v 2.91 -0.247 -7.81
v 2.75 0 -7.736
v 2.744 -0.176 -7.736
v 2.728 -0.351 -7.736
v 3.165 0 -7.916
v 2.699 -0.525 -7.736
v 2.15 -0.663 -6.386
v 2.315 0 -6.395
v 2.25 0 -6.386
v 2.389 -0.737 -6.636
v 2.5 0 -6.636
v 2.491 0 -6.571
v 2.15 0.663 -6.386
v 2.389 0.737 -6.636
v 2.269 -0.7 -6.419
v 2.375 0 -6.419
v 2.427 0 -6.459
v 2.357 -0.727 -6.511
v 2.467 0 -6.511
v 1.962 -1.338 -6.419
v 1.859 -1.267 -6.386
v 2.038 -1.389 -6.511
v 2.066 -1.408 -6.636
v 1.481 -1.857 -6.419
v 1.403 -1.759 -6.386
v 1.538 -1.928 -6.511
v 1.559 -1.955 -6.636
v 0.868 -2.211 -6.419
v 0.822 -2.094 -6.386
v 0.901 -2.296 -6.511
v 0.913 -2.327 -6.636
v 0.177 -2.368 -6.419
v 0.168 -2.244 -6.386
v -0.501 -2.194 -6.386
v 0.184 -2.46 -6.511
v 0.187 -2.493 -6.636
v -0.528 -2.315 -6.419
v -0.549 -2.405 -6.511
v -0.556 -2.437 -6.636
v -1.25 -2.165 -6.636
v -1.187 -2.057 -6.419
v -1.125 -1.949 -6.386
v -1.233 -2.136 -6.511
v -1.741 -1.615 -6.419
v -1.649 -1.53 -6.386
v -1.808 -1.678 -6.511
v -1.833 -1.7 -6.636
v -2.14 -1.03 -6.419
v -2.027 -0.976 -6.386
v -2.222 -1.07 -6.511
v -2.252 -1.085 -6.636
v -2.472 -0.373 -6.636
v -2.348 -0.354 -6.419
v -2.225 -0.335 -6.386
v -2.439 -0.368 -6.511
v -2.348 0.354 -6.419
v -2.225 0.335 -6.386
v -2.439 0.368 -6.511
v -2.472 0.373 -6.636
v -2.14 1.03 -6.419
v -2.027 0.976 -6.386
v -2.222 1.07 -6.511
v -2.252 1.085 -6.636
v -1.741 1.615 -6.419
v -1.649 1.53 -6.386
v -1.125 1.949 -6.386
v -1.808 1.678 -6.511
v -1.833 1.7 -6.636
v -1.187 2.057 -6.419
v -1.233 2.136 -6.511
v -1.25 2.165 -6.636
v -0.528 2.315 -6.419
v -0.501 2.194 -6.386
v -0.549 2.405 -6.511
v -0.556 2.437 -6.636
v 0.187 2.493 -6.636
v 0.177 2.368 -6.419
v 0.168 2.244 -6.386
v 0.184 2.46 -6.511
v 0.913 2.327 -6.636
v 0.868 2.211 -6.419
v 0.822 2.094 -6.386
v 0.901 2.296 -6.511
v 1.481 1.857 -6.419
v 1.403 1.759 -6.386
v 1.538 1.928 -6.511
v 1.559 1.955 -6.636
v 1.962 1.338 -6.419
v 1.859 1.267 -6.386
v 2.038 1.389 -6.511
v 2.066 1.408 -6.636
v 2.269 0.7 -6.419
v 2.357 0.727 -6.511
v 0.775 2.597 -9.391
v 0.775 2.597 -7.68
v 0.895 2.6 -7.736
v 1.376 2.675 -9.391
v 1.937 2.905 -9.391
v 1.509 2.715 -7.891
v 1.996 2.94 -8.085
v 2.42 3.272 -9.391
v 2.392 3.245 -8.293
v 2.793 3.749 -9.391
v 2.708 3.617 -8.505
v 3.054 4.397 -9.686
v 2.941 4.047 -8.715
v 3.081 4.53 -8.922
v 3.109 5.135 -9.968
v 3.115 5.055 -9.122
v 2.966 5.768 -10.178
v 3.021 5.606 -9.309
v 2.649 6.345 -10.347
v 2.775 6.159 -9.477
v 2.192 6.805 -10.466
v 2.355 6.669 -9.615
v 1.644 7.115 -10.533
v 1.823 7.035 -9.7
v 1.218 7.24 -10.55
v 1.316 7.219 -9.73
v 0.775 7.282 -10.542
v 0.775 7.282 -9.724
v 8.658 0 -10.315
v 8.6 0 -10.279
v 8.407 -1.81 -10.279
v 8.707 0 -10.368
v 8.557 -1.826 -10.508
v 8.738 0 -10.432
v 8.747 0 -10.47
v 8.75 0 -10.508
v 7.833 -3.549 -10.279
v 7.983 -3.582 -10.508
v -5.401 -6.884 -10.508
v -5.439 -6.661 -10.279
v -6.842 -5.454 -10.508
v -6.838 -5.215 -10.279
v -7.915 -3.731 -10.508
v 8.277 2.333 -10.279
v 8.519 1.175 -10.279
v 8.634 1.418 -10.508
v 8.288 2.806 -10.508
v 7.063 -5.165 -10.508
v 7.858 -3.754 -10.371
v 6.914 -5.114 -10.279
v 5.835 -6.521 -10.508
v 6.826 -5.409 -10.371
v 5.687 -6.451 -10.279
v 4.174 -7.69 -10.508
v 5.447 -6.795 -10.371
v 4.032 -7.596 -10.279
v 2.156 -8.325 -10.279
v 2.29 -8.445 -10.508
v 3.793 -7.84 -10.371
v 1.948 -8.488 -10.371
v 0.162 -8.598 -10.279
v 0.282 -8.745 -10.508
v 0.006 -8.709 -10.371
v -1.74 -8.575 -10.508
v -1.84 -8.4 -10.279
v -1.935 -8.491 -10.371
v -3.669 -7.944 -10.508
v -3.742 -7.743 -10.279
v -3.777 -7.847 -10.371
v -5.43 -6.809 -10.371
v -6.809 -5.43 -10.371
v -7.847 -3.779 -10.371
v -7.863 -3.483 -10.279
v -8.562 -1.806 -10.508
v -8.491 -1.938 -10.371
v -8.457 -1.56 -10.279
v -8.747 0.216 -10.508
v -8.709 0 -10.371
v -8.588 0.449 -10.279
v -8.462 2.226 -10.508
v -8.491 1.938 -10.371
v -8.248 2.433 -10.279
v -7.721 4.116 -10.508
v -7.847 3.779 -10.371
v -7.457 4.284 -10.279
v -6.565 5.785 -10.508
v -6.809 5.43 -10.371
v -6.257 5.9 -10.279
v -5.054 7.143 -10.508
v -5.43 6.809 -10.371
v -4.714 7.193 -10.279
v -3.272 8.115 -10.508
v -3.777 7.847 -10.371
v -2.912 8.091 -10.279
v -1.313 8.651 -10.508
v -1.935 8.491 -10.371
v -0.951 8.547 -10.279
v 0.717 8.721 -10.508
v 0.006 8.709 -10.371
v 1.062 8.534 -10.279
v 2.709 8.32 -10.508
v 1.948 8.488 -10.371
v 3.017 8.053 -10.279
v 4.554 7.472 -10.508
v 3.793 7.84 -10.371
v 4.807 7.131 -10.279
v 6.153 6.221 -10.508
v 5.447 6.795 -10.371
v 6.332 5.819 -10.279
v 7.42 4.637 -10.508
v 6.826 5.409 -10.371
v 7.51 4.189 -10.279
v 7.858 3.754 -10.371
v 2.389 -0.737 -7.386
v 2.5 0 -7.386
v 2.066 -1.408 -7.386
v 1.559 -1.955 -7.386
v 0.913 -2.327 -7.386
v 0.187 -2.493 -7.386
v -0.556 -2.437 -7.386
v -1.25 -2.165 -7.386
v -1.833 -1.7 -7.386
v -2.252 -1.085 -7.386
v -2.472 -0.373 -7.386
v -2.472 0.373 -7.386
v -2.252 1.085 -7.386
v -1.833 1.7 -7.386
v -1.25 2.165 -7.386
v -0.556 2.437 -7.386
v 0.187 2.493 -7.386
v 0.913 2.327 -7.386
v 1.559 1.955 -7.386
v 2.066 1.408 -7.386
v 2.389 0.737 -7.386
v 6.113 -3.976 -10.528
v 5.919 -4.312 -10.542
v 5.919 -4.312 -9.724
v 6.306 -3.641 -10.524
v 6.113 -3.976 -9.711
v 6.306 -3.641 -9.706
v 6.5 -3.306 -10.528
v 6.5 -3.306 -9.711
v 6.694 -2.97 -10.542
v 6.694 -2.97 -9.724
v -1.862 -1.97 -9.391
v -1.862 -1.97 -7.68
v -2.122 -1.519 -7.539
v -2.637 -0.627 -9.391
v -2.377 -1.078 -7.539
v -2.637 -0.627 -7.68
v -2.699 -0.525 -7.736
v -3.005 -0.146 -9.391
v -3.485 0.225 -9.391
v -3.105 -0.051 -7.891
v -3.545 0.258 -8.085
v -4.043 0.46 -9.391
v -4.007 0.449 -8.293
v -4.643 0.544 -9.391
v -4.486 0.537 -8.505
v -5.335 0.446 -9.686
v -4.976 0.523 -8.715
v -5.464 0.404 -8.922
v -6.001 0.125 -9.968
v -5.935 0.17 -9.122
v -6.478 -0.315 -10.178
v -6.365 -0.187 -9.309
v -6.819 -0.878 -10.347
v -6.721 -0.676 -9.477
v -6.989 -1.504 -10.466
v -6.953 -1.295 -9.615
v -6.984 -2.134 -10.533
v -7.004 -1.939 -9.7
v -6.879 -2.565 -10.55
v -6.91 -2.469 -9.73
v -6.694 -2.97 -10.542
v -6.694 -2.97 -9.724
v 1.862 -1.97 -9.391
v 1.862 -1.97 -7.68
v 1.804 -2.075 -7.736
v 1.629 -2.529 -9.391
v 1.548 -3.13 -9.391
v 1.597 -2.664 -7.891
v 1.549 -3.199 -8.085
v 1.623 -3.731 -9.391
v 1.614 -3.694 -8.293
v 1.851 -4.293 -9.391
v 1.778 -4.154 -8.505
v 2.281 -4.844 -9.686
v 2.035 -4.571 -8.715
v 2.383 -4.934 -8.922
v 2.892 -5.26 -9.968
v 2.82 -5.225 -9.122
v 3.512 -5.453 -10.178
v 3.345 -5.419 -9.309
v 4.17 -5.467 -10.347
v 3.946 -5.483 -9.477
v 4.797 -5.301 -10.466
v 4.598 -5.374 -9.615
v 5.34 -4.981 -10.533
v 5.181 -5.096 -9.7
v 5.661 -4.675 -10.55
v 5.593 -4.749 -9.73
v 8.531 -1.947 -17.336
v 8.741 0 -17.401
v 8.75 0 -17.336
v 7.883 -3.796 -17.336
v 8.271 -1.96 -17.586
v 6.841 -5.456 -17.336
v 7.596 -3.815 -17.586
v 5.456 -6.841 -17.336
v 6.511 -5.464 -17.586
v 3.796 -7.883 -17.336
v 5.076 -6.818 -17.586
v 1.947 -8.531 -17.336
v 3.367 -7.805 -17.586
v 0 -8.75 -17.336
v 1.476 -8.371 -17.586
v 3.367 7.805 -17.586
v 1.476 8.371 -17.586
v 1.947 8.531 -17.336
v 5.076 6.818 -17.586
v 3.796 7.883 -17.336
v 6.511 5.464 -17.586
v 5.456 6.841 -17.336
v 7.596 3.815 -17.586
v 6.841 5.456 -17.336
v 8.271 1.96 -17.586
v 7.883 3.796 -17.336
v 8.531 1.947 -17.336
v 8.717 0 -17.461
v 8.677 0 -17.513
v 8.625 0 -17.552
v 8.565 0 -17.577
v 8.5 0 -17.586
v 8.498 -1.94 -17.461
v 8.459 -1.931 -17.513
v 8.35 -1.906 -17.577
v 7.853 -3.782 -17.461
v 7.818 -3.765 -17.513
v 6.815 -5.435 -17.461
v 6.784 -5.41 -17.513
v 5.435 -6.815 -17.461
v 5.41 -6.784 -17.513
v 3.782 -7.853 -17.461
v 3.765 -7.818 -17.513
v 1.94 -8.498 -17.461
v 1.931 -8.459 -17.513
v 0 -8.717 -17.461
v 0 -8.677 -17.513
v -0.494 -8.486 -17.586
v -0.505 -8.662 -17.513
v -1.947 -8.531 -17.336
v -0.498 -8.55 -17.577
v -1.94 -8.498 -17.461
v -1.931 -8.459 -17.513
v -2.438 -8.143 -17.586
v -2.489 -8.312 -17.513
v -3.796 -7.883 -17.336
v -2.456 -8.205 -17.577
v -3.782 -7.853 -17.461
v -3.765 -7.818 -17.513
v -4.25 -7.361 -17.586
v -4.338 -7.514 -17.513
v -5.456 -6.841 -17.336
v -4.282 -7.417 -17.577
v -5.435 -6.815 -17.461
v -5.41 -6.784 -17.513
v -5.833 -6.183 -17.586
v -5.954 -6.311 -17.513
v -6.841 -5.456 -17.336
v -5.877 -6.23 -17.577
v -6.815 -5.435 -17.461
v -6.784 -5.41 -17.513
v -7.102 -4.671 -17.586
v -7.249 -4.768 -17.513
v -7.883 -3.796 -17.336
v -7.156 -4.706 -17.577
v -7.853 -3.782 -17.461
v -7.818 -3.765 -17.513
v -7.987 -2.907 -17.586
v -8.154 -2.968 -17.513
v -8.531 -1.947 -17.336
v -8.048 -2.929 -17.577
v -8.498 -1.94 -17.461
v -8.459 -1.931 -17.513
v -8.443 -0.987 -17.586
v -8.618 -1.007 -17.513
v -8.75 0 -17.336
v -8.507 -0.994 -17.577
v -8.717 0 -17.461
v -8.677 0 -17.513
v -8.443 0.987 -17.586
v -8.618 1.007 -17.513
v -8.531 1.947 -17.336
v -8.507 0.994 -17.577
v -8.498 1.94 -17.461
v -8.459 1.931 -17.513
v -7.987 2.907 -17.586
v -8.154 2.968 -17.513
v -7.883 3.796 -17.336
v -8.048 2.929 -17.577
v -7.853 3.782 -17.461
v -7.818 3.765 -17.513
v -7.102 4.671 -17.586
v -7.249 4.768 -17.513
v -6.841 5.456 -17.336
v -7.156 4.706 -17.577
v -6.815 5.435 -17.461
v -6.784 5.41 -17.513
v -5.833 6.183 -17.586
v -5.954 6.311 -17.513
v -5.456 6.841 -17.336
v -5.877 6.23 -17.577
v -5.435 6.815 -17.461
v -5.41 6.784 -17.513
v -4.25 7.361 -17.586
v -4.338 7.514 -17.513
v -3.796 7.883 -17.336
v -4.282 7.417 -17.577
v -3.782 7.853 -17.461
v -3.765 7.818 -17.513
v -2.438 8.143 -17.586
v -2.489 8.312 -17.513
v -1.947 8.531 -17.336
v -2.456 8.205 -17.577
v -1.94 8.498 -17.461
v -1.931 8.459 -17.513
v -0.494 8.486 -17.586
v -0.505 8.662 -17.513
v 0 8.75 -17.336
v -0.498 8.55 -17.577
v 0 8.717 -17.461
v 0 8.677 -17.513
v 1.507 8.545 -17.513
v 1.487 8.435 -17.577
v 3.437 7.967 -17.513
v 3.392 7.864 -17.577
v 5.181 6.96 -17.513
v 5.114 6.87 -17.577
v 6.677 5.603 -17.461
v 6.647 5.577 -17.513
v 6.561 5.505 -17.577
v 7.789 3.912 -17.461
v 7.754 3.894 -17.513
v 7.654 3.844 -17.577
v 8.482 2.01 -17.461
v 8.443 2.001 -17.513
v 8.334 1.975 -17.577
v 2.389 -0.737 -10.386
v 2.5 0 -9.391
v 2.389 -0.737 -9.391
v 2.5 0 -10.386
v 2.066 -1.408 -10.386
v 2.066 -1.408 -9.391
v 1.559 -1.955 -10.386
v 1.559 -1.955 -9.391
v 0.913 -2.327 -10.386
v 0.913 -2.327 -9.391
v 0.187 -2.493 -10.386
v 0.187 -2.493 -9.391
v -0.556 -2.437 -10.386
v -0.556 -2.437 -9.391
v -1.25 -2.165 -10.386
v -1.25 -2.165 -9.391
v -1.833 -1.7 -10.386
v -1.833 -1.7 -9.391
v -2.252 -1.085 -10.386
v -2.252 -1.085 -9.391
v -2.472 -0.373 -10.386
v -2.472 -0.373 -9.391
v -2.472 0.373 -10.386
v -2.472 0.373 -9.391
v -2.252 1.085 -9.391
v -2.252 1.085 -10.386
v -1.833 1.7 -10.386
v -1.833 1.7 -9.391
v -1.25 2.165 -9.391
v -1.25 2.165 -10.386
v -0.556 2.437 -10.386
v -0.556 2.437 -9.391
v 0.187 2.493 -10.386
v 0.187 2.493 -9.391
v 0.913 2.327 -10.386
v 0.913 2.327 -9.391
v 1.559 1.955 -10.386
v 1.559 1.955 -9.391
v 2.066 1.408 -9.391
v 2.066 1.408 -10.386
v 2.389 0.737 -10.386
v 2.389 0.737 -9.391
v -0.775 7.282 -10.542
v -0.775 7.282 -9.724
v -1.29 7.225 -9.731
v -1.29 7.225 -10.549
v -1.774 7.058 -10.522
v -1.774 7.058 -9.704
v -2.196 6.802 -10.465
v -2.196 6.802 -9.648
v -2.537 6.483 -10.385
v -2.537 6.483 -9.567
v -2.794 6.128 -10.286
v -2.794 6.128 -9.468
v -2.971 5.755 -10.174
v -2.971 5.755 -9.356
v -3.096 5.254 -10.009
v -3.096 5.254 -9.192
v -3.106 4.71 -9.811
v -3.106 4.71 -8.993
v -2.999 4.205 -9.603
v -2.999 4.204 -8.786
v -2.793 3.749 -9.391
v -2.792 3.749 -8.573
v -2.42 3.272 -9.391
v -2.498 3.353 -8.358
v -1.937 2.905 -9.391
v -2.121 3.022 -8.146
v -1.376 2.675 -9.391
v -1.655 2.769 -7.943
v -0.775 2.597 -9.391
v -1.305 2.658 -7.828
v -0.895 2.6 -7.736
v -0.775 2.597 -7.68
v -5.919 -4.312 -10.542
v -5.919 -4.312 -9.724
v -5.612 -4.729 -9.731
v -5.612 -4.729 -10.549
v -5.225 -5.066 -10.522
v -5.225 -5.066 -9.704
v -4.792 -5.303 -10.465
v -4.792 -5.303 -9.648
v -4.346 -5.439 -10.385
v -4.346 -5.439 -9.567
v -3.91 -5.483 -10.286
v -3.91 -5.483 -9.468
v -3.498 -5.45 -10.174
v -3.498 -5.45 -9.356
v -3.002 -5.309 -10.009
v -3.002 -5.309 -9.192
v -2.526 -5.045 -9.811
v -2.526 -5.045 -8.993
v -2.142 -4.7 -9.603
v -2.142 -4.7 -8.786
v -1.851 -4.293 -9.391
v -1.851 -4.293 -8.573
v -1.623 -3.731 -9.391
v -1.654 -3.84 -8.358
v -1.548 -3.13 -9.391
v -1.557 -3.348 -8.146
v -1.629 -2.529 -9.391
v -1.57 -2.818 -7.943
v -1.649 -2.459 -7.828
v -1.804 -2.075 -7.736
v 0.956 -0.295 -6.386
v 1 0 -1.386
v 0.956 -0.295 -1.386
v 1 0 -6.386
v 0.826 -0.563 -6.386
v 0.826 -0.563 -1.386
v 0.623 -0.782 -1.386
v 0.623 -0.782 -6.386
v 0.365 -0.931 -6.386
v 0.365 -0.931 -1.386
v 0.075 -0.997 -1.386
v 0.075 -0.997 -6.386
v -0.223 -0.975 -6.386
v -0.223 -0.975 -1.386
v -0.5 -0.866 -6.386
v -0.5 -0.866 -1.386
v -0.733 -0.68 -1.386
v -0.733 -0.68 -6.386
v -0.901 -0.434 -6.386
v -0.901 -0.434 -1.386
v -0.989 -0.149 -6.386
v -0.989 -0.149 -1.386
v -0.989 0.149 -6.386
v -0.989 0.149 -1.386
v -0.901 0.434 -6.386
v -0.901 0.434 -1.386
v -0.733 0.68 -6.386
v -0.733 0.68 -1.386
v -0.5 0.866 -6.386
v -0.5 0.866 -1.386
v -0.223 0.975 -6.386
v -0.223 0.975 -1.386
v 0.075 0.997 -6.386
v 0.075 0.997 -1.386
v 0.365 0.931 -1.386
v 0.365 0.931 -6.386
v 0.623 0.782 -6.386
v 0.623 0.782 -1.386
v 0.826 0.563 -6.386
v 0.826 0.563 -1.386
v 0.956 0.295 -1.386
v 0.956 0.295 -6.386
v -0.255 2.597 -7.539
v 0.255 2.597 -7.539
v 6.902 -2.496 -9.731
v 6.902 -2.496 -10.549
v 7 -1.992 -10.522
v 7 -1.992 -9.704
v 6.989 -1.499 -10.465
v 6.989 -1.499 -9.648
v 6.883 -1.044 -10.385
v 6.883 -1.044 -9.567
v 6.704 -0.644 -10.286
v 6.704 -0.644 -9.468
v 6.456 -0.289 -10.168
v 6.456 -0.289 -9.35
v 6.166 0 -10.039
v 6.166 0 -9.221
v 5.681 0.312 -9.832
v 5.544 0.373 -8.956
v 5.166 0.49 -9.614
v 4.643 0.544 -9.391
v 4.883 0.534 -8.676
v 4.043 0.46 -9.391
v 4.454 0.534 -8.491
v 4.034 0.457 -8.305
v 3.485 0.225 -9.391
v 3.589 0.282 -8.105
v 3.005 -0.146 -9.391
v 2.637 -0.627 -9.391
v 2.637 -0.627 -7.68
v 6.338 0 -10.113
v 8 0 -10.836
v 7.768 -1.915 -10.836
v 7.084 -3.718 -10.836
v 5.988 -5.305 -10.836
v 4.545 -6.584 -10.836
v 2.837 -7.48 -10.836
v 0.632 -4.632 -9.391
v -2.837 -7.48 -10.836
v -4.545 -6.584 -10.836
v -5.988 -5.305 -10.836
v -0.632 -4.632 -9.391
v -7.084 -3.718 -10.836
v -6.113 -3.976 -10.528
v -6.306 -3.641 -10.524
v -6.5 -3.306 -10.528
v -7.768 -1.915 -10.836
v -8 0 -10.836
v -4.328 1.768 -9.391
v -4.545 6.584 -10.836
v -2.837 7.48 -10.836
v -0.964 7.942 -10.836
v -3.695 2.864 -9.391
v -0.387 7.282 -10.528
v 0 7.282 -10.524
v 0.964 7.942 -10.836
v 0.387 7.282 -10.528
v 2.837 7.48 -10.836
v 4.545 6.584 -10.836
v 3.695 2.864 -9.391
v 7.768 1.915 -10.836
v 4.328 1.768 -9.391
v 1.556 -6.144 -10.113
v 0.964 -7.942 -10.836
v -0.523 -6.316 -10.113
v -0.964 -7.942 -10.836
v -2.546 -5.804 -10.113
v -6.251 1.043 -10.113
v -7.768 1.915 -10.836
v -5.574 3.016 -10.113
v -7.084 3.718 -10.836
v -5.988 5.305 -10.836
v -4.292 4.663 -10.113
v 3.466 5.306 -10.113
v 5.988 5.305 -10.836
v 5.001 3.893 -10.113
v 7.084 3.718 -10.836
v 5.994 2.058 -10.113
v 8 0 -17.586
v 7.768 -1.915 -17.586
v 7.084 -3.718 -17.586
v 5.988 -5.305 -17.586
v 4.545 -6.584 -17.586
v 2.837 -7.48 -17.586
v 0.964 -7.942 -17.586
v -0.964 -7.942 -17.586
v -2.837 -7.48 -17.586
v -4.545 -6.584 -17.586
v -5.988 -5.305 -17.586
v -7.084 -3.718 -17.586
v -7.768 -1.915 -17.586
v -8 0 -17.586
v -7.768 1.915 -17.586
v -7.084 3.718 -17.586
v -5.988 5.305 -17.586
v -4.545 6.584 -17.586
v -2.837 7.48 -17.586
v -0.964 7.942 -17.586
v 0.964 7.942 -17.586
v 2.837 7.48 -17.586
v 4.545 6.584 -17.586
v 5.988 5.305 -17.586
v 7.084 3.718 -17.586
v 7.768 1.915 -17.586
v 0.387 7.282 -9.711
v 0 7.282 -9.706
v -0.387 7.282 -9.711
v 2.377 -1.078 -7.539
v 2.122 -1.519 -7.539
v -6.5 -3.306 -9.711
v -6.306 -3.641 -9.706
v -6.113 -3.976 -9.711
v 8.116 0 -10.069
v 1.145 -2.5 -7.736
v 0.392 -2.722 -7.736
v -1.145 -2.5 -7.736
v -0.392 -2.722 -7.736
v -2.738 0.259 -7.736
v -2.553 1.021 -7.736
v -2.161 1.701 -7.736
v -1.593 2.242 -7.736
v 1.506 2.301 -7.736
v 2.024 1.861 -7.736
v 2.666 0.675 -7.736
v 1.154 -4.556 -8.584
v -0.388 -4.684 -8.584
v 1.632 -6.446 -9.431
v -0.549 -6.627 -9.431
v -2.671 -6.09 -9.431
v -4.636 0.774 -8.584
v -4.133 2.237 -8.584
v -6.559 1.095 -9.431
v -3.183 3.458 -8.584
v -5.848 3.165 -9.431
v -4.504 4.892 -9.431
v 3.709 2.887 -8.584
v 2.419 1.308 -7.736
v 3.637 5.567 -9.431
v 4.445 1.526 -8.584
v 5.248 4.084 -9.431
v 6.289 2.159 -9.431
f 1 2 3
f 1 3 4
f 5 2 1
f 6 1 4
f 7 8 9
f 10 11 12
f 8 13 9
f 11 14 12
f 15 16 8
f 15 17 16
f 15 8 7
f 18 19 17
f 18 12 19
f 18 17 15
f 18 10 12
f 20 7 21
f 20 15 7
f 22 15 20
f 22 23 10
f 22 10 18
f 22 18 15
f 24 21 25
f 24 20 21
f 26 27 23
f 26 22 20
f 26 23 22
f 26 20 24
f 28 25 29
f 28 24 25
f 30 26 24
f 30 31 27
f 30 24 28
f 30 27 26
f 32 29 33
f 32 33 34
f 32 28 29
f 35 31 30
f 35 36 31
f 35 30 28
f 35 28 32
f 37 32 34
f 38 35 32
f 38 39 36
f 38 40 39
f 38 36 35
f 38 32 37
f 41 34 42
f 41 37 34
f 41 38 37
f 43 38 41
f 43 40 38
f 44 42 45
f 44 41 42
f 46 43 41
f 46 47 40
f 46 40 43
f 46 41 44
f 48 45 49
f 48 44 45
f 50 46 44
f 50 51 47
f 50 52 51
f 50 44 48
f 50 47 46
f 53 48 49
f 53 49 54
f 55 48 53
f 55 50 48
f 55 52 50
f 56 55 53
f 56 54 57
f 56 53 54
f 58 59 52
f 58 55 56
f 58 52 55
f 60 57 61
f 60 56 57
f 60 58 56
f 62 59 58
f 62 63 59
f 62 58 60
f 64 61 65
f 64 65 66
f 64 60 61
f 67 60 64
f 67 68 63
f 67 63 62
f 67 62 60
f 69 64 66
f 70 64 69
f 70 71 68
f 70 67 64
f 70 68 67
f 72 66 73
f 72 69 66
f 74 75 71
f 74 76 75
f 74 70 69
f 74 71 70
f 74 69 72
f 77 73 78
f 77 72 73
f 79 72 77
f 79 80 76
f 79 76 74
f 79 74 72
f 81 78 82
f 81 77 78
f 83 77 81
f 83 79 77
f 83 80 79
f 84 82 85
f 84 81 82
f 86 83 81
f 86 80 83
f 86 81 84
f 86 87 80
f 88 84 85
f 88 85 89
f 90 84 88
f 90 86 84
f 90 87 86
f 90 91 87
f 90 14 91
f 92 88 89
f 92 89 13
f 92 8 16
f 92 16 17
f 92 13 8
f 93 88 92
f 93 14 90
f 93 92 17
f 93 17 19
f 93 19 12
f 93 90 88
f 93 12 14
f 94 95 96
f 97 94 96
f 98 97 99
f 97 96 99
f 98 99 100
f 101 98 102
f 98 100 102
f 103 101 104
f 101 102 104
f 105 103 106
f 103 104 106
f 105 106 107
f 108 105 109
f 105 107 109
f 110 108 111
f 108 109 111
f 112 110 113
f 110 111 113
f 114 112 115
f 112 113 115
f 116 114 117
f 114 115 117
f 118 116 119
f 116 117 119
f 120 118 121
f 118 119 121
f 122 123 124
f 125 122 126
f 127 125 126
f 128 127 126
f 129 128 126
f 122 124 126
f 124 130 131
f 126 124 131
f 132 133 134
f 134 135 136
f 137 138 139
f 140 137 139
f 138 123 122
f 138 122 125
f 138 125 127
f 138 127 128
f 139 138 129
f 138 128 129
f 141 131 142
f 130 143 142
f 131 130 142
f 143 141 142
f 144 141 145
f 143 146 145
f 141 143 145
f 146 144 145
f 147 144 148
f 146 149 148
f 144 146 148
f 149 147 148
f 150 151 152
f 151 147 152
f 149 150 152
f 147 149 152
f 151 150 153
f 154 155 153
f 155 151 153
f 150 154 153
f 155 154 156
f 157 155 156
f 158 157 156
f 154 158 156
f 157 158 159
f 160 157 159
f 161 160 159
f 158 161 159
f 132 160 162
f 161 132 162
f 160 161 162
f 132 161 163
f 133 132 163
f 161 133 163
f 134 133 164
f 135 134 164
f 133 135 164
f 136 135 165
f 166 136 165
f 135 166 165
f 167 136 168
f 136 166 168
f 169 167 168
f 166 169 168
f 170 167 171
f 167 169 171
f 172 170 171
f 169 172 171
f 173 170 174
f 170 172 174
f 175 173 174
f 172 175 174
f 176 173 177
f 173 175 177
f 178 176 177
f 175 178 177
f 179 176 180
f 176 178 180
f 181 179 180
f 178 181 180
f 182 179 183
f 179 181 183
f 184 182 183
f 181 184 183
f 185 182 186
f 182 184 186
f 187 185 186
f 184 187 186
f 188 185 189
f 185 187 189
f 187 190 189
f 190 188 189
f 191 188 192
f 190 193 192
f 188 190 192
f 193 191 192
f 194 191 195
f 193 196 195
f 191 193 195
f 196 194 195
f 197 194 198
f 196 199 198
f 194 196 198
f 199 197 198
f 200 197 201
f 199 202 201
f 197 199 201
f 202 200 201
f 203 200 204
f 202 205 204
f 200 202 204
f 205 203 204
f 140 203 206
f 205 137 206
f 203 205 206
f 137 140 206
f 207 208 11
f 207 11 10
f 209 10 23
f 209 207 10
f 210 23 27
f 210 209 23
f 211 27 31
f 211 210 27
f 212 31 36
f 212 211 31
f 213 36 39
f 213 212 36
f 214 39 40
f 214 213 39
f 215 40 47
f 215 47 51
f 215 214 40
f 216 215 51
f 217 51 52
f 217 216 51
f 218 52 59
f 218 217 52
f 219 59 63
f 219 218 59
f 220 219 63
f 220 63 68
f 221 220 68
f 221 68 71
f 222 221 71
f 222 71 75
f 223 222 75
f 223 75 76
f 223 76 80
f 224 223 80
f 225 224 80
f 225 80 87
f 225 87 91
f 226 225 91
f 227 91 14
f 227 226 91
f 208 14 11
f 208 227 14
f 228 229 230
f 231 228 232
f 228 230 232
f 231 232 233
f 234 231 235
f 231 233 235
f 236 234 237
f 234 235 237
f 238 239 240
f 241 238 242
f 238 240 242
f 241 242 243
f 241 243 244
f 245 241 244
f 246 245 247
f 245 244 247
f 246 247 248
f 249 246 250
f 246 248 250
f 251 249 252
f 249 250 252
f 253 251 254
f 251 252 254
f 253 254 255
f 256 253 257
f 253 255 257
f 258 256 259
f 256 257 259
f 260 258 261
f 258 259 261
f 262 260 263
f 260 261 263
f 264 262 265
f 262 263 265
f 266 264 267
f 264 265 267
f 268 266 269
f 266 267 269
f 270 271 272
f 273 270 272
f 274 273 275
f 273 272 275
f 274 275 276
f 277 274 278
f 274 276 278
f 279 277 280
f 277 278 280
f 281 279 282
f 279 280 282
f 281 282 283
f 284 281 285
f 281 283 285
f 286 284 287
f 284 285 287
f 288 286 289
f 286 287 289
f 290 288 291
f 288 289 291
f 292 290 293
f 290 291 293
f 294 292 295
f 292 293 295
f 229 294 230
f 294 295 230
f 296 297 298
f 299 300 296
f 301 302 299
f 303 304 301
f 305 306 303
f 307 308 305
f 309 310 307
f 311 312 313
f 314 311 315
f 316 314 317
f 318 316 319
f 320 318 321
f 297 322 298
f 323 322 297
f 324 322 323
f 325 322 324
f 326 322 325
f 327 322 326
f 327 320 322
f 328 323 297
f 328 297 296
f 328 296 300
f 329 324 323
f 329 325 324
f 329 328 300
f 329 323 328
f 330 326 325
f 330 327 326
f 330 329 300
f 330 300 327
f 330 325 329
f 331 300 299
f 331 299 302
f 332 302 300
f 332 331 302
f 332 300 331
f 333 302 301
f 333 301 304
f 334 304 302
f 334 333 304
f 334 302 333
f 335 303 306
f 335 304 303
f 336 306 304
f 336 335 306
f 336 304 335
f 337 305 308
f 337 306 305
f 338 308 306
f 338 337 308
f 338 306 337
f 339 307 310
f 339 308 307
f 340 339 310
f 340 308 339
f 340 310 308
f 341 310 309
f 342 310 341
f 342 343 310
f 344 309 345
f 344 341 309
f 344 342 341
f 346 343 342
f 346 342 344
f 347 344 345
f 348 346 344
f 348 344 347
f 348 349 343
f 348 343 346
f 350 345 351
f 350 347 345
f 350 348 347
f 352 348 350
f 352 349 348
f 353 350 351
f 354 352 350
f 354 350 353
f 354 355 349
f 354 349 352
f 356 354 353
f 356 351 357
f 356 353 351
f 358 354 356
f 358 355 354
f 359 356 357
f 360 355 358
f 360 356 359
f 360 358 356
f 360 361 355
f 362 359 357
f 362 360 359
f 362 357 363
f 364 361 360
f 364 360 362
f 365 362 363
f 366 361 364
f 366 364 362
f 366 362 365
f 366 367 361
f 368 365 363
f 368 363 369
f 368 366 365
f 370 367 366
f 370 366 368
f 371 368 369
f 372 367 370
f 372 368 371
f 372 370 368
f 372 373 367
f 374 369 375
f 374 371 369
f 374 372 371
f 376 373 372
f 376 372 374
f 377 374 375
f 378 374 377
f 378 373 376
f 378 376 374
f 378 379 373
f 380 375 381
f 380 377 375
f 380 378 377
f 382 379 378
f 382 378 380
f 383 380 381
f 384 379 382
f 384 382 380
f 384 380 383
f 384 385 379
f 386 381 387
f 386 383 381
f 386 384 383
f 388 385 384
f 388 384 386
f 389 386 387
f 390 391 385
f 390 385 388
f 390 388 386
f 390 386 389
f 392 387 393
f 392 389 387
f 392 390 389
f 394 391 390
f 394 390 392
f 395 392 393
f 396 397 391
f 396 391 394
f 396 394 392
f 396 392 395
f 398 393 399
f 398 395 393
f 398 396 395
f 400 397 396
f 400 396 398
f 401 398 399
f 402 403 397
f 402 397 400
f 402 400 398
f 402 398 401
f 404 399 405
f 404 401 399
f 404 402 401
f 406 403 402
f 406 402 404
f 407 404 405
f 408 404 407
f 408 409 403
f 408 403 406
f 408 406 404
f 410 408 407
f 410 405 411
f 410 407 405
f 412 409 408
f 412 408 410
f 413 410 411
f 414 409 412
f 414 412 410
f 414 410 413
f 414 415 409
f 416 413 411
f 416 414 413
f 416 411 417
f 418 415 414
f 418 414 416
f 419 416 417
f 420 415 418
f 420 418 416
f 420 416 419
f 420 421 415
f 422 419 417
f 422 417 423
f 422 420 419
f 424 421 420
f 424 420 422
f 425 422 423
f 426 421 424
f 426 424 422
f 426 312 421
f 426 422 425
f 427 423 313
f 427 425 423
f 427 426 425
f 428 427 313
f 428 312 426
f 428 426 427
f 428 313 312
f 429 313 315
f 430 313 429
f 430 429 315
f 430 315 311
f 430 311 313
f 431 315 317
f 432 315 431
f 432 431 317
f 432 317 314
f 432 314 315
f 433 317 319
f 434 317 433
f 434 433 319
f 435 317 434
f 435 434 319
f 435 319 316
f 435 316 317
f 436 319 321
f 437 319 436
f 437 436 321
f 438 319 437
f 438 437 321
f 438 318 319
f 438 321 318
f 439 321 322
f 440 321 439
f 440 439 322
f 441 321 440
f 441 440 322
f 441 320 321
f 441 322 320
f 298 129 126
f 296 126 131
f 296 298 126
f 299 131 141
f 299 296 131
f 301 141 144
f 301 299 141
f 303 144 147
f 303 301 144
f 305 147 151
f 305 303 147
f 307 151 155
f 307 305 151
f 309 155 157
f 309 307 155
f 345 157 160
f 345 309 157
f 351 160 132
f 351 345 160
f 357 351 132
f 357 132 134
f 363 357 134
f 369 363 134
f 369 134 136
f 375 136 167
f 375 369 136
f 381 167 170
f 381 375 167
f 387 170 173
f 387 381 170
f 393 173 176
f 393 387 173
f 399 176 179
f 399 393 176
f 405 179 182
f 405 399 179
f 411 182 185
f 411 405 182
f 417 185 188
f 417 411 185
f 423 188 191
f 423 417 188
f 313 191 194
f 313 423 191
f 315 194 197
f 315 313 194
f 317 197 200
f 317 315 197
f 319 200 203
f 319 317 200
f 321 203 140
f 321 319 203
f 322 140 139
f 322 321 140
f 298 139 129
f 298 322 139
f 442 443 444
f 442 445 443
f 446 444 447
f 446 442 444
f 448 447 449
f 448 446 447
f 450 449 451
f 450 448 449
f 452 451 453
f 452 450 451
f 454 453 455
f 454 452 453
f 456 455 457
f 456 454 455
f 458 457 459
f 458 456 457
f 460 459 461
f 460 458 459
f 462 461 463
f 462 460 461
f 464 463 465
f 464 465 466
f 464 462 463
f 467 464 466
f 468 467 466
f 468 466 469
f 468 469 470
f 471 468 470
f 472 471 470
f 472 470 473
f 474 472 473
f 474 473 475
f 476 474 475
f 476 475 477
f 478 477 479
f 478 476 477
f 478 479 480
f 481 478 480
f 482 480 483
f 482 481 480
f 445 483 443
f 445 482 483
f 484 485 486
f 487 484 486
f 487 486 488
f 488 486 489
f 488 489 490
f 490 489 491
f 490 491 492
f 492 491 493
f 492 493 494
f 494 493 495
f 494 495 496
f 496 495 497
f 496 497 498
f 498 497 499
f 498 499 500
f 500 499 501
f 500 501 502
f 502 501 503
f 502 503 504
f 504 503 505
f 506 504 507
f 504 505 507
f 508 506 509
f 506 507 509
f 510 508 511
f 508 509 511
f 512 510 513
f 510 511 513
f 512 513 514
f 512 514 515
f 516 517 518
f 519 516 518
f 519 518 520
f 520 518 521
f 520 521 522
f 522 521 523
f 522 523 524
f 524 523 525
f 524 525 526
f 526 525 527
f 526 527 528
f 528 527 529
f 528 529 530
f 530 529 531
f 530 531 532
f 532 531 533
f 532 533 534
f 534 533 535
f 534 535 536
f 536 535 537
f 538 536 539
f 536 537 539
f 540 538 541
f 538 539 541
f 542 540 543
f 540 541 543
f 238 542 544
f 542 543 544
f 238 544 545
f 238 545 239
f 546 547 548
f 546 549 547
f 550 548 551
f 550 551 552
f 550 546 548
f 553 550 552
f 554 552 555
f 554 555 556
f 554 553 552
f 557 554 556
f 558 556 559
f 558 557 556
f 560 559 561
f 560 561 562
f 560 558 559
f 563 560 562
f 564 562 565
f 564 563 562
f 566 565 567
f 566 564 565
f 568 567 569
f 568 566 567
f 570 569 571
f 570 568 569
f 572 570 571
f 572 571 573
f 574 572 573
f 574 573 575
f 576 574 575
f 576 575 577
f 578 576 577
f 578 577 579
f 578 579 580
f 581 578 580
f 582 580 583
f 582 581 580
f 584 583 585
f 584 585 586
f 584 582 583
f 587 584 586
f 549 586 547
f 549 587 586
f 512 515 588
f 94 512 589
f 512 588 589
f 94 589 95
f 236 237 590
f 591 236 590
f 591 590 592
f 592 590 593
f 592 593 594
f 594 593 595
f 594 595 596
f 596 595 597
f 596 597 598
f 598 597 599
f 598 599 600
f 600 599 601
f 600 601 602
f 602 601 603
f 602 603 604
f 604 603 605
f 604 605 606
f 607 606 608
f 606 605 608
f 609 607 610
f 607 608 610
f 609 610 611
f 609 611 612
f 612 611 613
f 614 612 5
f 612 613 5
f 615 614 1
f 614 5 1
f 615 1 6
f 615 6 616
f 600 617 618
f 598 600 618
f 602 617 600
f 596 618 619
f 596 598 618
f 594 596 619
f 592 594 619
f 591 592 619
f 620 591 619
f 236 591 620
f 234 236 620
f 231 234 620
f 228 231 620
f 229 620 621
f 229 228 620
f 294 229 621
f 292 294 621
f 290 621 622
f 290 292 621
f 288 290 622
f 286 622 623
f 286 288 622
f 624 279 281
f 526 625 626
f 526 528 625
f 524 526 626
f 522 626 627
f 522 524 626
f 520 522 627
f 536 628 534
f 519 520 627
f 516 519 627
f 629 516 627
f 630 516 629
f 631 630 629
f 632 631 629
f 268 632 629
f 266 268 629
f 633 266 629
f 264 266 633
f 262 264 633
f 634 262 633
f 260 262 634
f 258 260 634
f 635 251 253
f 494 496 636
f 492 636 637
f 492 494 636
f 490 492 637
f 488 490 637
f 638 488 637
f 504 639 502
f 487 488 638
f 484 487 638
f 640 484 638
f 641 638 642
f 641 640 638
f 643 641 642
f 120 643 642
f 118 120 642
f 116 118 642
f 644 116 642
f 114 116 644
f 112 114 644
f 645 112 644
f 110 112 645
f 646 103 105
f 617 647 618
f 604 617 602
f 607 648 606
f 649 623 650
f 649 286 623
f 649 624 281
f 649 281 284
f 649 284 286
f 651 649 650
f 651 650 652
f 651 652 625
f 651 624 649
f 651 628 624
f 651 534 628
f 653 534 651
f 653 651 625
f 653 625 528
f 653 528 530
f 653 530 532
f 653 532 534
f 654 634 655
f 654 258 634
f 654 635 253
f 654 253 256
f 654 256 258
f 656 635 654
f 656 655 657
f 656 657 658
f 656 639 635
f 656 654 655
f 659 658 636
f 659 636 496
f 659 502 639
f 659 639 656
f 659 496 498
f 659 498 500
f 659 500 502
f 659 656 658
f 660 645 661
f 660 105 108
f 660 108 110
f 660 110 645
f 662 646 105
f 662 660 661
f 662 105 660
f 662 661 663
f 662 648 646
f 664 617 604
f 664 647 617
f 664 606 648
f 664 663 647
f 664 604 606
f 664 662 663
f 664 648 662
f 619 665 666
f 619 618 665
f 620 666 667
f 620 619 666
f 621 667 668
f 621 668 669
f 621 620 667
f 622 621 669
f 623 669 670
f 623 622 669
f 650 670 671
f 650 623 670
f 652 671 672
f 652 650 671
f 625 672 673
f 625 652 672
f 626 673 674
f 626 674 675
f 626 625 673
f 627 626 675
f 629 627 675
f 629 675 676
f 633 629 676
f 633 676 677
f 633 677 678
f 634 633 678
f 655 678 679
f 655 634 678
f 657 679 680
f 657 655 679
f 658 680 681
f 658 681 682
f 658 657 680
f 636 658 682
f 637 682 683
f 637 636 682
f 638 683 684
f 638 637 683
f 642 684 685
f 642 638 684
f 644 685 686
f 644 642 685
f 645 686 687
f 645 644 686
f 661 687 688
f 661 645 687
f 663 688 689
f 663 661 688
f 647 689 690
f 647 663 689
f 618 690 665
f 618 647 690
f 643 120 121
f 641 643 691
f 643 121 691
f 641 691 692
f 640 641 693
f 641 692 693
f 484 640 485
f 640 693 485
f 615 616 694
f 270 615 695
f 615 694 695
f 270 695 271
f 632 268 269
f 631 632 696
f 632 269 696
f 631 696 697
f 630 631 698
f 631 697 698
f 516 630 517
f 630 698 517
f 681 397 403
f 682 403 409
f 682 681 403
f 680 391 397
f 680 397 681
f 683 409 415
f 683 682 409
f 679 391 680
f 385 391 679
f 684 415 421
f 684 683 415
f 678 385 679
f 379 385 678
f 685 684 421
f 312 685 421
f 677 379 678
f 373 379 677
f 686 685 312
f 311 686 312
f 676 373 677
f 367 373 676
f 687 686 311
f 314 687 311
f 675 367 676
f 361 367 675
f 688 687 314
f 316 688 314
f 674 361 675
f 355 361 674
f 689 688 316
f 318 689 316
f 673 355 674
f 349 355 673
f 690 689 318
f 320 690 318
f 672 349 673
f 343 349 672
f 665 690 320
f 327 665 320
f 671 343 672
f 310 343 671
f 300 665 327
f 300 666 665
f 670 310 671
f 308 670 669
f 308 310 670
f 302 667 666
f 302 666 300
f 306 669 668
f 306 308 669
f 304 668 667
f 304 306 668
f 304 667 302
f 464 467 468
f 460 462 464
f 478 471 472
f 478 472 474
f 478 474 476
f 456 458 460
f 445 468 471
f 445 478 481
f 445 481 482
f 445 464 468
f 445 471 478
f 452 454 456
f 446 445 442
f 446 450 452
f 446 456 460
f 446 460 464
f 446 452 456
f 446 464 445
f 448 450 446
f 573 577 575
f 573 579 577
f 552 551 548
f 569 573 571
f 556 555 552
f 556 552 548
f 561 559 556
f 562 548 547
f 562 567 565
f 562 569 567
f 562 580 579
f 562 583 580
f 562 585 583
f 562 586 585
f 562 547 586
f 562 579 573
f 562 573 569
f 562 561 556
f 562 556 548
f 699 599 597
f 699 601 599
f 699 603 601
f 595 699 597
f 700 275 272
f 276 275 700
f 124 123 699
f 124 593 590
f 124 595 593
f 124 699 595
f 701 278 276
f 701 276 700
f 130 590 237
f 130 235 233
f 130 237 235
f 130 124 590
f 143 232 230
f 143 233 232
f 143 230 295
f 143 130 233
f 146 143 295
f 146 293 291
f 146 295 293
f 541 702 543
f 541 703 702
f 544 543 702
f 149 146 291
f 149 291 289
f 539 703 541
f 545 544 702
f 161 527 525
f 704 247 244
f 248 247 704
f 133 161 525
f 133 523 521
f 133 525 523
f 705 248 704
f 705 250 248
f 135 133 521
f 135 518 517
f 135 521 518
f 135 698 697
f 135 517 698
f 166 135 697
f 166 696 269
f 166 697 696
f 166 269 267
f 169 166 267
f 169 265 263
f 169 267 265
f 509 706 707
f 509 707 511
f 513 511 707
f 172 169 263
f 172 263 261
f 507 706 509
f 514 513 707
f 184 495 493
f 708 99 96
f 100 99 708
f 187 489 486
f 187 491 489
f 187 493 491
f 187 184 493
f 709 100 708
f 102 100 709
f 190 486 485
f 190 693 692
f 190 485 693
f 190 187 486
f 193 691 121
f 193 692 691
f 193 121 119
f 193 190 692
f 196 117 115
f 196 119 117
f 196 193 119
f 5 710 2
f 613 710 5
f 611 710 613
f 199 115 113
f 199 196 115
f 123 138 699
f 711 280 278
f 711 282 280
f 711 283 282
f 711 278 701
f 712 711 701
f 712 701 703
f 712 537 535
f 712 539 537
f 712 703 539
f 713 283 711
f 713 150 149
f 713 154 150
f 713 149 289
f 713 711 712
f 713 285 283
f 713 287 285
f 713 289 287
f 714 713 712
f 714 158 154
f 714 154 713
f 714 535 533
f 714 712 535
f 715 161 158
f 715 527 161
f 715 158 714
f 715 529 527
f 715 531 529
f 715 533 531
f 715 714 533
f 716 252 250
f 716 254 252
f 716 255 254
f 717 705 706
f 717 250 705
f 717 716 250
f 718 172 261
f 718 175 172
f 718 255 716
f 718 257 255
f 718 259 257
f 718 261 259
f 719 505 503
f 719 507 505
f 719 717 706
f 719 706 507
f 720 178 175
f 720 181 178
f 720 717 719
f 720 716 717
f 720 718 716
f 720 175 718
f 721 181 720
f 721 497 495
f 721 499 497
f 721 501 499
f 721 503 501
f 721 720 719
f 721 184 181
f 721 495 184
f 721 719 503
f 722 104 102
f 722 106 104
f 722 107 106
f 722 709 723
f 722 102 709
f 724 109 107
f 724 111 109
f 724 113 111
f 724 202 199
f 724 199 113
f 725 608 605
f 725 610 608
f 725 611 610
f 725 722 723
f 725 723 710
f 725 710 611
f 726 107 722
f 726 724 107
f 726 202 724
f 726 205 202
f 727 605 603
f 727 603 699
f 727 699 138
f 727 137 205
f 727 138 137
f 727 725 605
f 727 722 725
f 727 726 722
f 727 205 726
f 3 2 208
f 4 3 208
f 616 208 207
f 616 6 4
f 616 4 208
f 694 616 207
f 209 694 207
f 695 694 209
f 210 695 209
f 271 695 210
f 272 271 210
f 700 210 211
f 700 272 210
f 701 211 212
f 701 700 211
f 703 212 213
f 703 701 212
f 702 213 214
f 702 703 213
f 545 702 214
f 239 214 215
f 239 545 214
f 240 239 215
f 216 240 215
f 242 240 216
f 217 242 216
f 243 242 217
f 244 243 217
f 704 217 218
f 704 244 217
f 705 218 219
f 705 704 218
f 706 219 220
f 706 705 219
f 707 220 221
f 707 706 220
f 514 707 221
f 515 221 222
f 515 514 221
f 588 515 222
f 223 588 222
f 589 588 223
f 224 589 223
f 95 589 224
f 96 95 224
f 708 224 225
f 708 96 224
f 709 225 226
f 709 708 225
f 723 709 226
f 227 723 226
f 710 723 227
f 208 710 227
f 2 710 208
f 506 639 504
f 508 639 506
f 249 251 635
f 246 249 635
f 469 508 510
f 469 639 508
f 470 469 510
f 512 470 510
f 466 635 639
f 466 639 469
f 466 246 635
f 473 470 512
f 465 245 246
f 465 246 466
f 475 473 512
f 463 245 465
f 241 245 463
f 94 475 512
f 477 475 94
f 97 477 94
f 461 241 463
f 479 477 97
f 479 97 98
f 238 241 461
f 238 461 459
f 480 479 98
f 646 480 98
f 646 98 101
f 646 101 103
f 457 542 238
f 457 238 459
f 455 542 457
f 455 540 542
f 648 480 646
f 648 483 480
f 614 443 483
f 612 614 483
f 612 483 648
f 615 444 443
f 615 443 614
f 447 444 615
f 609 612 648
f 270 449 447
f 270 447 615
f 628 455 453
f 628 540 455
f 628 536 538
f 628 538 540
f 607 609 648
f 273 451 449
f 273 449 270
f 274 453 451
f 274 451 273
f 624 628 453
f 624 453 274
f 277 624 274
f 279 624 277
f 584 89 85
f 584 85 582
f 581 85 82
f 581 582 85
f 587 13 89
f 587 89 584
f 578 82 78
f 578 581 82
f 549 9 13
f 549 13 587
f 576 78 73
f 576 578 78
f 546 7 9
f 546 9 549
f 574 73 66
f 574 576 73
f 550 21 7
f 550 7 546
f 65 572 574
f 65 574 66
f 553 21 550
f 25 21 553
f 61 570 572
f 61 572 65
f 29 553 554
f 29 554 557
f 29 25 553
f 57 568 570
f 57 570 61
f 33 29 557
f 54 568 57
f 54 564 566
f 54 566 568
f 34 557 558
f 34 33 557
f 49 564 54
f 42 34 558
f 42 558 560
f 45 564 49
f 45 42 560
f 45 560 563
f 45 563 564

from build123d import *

# Parameters (mm, degrees)
CUT_EXTRUDE_1_DEPTH      = 10
PATTERN_CIRCULAR_1_COUNT = 3
FILLET_1_R               = 0.5
SCALE_1_SCALE            = 0.5


with BuildPart() as part:
    # Эскиз1 → Повернуть1 (revolve)
    with BuildSketch(Plane(origin=(0, 0, 0), x_dir=(0, 0, -1), z_dir=(1, 0, 0)), mode=Mode.PRIVATE) as revolve_1_sk:
        Polygon((-9, 0), (-9, 2), (1, 2), (1, 5), (3, 5), (3.7, 5.5), (8.916460066, 17.5), (23.4, 17.5), (23.4, 16), (9.9, 16), (7.009211714, 9.35), (7.009211714, 5), (9, 5), (9, 0), align=None)
    revolve(revolve_1_sk.sketch.rotate(Axis((0, 0, -9), (0, 0, -1)), 90), axis=Axis((0, 0, -9), (0, 0, -1)))

    # Эскиз2 → Вырез-Вытянуть1 (cut)
    with BuildSketch(Plane.XY.offset(-1)):
        with BuildLine():
            Line((1.55, 14.5641447), (-1.55, 14.5641447))
            ThreePointArc((-1.55, 14.5641447), (-6.235, 9.8791447), (-1.55, 5.1941447))
            Line((-1.55, 5.1941447), (1.55, 5.1941447))
            ThreePointArc((1.55, 5.1941447), (6.235, 9.8791447), (1.55, 14.5641447))
        make_face()
    cut_extrude_1 = extrude(amount=-CUT_EXTRUDE_1_DEPTH, mode=Mode.SUBTRACT)

    # Круговой массив1: Вырез-Вытянуть1 ×3 about axis
    pattern_circular_1_axis = Axis((0, 0, 0), (0, 0, 1))
    for i in range(1, PATTERN_CIRCULAR_1_COUNT):
        add(cut_extrude_1.rotate(pattern_circular_1_axis, i * 360 / PATTERN_CIRCULAR_1_COUNT), mode=Mode.SUBTRACT)

    # Скругление1
    fillet_1_edges = [part.edges().sort_by_distance(p)[0] for p in [
        (-17.5, 0, -23.4),
        (-17.5, 0, -8.916460066),
        (-5, 0, -1),
    ]]
    fillet(fillet_1_edges, radius=FILLET_1_R)


with BuildPart() as part_1:
    # Масштаб1: scaled about (3.2e-07, -3.26e-07, -11.771980124)
    add(part.part.scale(SCALE_1_SCALE).moved(Location((1.6e-07, -1.63e-07, -5.885990062))))


solid = part_1.part
